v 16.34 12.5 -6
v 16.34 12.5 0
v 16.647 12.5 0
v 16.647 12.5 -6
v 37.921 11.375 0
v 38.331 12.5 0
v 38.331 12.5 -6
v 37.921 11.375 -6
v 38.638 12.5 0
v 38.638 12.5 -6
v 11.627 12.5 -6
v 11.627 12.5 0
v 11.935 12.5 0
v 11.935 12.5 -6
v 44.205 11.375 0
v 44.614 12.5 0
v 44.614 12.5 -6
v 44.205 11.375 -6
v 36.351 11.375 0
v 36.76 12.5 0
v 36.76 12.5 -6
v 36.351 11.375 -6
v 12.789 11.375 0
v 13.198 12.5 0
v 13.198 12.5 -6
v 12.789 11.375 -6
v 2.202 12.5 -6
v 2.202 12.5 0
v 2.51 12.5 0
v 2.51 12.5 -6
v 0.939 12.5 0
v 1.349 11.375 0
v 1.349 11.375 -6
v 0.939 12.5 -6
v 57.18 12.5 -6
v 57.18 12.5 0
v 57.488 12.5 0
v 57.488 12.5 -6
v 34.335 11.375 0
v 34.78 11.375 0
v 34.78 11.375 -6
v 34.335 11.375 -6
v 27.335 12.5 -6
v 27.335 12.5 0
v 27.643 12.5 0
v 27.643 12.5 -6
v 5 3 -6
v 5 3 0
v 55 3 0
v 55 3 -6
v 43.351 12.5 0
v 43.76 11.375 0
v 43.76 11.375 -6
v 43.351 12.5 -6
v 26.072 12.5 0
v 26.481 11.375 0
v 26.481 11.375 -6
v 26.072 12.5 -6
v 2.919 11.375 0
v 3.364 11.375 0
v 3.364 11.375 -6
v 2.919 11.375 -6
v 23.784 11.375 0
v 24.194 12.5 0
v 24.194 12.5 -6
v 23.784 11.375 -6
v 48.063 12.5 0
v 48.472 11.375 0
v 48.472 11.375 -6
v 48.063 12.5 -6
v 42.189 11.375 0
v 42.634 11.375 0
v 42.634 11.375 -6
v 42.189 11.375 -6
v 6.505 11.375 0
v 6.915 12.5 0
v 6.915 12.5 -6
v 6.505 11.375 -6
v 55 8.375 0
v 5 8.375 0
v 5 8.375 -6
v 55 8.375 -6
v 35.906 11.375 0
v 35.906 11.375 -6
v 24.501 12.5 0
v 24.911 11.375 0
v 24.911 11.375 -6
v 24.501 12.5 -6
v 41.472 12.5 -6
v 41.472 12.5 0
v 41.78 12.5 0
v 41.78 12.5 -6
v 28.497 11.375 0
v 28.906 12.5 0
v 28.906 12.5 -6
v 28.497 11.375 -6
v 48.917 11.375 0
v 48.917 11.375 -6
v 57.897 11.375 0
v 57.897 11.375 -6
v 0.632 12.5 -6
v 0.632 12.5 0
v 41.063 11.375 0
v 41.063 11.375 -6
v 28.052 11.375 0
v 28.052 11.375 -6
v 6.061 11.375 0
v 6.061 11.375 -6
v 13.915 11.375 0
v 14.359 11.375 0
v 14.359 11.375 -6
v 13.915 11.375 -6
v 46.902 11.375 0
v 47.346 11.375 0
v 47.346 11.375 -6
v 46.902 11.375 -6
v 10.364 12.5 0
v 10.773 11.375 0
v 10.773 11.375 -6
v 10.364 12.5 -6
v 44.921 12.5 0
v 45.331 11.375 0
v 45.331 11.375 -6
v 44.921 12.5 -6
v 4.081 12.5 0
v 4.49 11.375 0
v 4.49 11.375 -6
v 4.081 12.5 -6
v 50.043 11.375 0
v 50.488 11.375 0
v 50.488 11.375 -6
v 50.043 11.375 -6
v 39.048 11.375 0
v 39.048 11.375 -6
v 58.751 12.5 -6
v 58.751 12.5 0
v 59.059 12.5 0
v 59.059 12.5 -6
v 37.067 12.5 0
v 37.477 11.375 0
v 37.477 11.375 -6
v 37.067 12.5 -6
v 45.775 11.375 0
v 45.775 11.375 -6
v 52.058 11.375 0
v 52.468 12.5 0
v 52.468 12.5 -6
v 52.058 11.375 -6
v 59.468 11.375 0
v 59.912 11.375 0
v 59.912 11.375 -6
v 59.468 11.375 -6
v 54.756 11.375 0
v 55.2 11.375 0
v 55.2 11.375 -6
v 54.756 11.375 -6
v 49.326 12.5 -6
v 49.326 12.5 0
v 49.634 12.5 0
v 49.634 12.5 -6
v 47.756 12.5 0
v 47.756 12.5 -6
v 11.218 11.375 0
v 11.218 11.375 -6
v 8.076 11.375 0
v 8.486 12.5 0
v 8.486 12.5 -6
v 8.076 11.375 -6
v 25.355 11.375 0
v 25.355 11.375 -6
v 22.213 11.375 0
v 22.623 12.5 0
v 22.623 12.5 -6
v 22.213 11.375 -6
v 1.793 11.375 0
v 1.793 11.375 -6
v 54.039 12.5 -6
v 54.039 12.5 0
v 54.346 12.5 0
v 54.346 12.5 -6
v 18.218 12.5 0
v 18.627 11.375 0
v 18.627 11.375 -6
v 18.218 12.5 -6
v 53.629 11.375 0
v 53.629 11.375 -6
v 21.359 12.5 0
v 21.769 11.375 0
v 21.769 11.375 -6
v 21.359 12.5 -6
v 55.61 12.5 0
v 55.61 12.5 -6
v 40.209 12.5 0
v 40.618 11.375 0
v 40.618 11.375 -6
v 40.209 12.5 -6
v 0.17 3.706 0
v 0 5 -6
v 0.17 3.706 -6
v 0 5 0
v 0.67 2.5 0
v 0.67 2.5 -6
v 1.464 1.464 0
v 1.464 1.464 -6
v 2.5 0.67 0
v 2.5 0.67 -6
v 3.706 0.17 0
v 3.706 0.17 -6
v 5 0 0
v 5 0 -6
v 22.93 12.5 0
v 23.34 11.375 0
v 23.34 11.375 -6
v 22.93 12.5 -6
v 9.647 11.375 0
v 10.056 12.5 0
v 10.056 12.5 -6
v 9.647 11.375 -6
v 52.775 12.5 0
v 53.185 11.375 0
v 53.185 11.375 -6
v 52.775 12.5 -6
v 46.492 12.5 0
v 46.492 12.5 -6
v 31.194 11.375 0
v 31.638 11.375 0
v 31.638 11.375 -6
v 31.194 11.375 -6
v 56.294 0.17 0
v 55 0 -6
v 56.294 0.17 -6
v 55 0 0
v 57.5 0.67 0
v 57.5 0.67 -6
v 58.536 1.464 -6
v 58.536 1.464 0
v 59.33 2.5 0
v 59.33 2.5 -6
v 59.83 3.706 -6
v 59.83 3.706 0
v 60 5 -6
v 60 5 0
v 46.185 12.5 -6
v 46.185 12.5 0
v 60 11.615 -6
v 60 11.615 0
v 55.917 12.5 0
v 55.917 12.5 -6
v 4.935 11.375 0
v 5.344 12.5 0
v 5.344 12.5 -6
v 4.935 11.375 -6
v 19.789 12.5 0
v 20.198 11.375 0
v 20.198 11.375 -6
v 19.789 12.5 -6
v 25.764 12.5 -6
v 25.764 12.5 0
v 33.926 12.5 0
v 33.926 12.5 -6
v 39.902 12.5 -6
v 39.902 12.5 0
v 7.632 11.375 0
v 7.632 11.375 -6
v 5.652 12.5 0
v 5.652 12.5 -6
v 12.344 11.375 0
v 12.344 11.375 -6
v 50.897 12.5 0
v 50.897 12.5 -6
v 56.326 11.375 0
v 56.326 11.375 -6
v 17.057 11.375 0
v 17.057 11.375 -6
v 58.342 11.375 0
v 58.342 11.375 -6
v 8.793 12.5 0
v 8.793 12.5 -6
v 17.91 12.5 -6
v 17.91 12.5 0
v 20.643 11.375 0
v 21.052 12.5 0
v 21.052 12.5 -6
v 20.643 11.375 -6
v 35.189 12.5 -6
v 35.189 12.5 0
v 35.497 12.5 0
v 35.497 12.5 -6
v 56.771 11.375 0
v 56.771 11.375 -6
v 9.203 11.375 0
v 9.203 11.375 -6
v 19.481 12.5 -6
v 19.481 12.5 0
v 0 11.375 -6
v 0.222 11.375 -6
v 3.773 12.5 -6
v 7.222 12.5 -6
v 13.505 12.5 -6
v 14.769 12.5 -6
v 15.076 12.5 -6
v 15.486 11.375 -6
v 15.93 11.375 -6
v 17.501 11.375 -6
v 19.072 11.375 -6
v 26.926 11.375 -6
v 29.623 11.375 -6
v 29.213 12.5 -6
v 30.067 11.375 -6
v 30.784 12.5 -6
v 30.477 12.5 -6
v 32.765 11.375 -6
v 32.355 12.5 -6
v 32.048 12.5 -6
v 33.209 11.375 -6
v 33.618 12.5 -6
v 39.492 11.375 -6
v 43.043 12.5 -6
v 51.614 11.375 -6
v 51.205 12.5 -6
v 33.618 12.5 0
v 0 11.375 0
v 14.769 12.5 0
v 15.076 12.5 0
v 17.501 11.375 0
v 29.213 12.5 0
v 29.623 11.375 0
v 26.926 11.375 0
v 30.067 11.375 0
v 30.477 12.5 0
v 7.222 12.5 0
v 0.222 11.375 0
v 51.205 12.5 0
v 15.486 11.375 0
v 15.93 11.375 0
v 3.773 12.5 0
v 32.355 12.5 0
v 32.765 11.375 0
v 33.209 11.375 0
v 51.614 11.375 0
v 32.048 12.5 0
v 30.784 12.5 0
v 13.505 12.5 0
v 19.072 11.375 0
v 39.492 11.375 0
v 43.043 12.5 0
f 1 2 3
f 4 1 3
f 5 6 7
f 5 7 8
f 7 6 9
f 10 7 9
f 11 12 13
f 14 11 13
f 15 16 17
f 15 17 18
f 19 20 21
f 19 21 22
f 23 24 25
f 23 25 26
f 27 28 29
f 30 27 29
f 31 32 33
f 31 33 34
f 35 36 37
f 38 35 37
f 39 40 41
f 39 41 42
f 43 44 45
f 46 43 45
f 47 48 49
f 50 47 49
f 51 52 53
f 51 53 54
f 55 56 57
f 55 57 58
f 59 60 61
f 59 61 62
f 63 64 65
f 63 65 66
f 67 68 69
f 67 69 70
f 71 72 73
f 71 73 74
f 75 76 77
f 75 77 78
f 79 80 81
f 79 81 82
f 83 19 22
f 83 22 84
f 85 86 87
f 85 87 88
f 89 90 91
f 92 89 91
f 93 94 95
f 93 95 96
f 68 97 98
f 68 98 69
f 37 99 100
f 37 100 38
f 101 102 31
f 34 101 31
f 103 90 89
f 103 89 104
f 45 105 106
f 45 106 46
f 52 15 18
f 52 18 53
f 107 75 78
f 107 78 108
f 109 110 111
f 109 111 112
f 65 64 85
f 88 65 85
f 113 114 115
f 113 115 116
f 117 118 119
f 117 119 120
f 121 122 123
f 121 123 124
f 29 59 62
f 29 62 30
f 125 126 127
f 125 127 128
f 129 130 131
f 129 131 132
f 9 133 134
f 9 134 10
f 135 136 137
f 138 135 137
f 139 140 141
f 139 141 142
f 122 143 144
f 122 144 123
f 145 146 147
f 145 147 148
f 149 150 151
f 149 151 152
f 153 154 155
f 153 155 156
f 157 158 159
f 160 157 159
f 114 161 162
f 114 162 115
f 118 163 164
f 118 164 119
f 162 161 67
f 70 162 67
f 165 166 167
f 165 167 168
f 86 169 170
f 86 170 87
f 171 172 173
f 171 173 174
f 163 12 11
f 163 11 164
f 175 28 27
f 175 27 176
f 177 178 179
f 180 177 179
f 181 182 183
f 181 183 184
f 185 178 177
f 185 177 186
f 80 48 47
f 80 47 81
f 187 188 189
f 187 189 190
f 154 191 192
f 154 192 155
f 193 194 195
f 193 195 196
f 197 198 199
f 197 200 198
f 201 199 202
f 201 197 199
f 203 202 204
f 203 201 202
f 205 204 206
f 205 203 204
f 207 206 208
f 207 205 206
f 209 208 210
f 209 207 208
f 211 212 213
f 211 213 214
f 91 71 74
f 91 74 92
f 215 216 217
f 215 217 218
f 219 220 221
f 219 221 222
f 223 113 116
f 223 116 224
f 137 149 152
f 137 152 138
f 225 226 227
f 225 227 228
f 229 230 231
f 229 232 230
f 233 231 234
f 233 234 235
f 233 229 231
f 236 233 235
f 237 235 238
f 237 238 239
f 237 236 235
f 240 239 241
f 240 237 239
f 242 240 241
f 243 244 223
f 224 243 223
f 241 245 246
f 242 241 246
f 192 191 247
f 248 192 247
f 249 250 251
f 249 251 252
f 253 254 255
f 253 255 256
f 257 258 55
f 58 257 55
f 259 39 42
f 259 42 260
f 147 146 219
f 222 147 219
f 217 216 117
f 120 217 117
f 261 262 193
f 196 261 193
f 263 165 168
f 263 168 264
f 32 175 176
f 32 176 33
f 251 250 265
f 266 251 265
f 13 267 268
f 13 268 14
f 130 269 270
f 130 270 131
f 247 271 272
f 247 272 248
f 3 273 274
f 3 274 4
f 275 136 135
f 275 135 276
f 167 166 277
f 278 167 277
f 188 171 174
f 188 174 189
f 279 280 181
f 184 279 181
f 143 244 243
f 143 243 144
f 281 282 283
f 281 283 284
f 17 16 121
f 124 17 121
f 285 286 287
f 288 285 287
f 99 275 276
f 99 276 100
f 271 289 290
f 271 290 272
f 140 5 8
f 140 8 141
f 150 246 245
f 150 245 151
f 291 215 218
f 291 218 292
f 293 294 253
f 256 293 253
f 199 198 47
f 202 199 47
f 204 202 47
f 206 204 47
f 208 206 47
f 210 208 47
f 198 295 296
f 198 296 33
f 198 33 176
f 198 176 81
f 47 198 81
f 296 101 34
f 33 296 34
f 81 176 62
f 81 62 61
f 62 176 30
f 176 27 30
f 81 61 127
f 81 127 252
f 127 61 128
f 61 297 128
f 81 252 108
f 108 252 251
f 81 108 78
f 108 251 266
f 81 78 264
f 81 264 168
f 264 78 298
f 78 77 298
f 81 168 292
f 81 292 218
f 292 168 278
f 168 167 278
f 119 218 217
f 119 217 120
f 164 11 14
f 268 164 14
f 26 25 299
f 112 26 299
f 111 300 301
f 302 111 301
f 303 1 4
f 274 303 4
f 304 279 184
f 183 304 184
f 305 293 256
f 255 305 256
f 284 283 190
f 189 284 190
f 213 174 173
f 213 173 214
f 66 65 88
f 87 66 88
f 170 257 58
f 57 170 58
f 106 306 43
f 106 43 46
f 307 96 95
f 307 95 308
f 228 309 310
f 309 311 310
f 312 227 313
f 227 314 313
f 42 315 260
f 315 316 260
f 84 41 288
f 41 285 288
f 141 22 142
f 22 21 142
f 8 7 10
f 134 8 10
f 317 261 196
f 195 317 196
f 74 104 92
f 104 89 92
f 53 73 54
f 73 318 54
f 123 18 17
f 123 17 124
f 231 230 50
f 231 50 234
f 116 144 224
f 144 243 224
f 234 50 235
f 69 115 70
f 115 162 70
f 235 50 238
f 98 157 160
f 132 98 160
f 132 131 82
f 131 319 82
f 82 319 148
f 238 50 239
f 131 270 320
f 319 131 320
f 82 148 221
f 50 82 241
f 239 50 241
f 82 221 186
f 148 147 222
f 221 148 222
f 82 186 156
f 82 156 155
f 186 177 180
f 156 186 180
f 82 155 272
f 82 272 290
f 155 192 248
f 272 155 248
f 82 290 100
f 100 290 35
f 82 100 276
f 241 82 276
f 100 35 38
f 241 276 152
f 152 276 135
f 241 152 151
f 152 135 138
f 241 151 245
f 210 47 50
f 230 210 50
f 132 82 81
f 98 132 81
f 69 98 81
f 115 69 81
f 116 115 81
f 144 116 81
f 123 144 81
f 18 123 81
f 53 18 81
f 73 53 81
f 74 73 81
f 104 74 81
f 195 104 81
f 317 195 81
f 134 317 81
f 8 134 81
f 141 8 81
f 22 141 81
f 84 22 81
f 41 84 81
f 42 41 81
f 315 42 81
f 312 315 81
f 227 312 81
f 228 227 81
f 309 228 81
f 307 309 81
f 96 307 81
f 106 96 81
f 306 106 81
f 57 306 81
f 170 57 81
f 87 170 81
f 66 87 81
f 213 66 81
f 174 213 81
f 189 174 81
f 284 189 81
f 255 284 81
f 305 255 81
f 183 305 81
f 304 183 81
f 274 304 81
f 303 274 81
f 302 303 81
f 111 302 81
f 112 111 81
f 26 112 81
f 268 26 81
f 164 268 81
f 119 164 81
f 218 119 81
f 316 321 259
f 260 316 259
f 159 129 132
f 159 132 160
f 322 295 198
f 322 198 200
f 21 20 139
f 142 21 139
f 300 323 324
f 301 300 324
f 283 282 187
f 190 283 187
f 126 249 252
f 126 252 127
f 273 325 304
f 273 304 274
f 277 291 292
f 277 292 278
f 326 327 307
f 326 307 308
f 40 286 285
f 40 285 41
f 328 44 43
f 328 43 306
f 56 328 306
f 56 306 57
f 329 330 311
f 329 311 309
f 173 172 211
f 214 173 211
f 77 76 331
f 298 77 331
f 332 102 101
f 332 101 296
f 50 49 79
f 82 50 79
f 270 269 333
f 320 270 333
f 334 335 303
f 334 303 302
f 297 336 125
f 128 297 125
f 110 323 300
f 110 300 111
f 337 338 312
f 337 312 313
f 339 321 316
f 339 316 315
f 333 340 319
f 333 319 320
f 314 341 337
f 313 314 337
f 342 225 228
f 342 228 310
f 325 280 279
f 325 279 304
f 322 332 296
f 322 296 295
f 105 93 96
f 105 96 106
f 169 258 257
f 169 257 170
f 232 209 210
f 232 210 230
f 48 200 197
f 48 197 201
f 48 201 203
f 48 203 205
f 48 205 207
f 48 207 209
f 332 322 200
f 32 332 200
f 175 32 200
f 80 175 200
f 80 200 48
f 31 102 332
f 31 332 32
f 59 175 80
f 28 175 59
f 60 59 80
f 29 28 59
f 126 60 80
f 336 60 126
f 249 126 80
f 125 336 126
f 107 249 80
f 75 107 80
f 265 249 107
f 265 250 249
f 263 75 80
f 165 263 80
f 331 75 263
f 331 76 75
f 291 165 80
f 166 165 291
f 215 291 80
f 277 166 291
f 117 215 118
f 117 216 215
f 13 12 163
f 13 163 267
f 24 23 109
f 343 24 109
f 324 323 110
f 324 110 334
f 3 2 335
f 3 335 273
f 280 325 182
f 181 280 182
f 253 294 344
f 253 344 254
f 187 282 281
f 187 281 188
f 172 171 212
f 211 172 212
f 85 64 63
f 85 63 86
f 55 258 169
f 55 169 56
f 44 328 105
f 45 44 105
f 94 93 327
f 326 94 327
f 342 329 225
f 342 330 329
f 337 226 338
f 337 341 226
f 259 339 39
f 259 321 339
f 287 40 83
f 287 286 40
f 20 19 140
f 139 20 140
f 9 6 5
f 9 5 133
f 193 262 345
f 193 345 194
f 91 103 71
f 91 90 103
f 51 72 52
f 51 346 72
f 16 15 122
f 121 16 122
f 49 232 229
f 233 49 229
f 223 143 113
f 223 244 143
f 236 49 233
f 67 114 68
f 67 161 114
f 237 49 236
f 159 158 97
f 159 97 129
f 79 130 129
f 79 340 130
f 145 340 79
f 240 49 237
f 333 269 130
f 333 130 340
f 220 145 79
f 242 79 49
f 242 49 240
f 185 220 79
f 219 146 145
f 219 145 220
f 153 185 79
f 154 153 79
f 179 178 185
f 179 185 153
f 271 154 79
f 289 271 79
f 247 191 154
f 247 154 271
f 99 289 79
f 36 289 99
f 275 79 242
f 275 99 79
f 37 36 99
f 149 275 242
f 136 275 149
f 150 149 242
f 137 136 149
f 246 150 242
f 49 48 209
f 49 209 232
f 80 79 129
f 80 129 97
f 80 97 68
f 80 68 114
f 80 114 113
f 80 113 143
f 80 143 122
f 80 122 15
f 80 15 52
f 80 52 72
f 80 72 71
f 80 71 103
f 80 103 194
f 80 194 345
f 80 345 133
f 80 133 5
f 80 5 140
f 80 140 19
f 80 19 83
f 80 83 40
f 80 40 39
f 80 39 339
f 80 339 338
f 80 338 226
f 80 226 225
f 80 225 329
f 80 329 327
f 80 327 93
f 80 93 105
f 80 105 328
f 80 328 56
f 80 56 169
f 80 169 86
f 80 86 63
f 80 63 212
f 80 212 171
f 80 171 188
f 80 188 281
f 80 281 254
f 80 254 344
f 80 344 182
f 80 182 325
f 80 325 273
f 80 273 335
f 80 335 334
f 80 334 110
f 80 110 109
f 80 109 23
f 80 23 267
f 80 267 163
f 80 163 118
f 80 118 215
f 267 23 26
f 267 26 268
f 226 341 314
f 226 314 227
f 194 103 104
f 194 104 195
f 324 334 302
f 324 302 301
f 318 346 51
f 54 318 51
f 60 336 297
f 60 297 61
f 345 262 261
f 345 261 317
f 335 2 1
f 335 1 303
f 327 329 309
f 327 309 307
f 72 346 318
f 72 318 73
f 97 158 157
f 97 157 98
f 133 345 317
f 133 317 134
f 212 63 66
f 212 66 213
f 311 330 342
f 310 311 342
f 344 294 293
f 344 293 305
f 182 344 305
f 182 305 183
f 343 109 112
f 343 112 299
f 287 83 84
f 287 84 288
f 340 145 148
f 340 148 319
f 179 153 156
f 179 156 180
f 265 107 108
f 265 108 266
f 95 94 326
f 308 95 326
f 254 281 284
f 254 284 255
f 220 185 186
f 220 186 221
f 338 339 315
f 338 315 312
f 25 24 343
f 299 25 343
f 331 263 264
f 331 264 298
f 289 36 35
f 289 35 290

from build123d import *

# Parameters (mm, degrees)
BLANKSKE_W          = 60
BLANKSKE_H          = 12.5
BLANK_DEPTH         = 6
TOOTHCUTSIM_DEPTH   = 62.581247146
TEETHCUTS_COUNT     = 39
TEETHCUTS_PITCH     = 1.570796325
SKETCH1_W           = 60
SKETCH1_H           = 6
BOSS_EXTRUDE1_DEPTH = 10
SKETCH4_W           = 88.884112985
SKETCH4_H           = 15.47203355
CUT_EXTRUDE3_DEPTH  = 62.581247146
SKETCH3_W           = 50
SKETCH3_H           = 5.375
CUT_EXTRUDE2_DEPTH  = 10
FILLET3_R           = 5


with BuildPart() as part:
    # BlankSke → Blank (new body)
    with BuildSketch(Plane.XY):
        with Locations((30, 6.25)):
            Rectangle(BLANKSKE_W, BLANKSKE_H)
    extrude(amount=-BLANK_DEPTH)

    # TooCutSkeSim → ToothCutSim (cut, through all)
    with BuildSketch(Plane.XY):
        Polygon((0.222217685, 11.375), (-0.222217685, 11.375), (-0.640929042, 12.5254), (0.640929042, 12.5254), align=None)
    toothcutsim = extrude(amount=-TOOTHCUTSIM_DEPTH, mode=Mode.SUBTRACT)

    # TeethCuts: ToothCutSim ×39
    with Locations(*[(i * TEETHCUTS_PITCH, 0, 0) for i in range(1, TEETHCUTS_COUNT)]):
        add(toothcutsim, mode=Mode.SUBTRACT)

    # Sketch1 → Boss-Extrude1 (add)
    with BuildSketch(Plane.XZ):
        with Locations((30, -3)):
            Rectangle(SKETCH1_W, SKETCH1_H)
    extrude(amount=BOSS_EXTRUDE1_DEPTH)

    # Sketch4 → Cut-Extrude3 (cut, through all)
    with BuildSketch(Plane.XY):
        with Locations((41.448981395, -7.736016775)):
            Rectangle(SKETCH4_W, SKETCH4_H)
    extrude(amount=-CUT_EXTRUDE3_DEPTH, mode=Mode.SUBTRACT)

    # Sketch3 → Cut-Extrude2 (cut)
    with BuildSketch(Plane.XY):
        with Locations((30, 5.6875)):
            Rectangle(SKETCH3_W, SKETCH3_H)
    extrude(amount=-CUT_EXTRUDE2_DEPTH, mode=Mode.SUBTRACT)

    # Fillet3
    fillet3_edges = [part.edges().sort_by_distance(p)[0] for p in [
        (0, 0, -3),
        (60, 0, -3),
    ]]
    fillet(fillet3_edges, radius=FILLET3_R)


solid = part.part
